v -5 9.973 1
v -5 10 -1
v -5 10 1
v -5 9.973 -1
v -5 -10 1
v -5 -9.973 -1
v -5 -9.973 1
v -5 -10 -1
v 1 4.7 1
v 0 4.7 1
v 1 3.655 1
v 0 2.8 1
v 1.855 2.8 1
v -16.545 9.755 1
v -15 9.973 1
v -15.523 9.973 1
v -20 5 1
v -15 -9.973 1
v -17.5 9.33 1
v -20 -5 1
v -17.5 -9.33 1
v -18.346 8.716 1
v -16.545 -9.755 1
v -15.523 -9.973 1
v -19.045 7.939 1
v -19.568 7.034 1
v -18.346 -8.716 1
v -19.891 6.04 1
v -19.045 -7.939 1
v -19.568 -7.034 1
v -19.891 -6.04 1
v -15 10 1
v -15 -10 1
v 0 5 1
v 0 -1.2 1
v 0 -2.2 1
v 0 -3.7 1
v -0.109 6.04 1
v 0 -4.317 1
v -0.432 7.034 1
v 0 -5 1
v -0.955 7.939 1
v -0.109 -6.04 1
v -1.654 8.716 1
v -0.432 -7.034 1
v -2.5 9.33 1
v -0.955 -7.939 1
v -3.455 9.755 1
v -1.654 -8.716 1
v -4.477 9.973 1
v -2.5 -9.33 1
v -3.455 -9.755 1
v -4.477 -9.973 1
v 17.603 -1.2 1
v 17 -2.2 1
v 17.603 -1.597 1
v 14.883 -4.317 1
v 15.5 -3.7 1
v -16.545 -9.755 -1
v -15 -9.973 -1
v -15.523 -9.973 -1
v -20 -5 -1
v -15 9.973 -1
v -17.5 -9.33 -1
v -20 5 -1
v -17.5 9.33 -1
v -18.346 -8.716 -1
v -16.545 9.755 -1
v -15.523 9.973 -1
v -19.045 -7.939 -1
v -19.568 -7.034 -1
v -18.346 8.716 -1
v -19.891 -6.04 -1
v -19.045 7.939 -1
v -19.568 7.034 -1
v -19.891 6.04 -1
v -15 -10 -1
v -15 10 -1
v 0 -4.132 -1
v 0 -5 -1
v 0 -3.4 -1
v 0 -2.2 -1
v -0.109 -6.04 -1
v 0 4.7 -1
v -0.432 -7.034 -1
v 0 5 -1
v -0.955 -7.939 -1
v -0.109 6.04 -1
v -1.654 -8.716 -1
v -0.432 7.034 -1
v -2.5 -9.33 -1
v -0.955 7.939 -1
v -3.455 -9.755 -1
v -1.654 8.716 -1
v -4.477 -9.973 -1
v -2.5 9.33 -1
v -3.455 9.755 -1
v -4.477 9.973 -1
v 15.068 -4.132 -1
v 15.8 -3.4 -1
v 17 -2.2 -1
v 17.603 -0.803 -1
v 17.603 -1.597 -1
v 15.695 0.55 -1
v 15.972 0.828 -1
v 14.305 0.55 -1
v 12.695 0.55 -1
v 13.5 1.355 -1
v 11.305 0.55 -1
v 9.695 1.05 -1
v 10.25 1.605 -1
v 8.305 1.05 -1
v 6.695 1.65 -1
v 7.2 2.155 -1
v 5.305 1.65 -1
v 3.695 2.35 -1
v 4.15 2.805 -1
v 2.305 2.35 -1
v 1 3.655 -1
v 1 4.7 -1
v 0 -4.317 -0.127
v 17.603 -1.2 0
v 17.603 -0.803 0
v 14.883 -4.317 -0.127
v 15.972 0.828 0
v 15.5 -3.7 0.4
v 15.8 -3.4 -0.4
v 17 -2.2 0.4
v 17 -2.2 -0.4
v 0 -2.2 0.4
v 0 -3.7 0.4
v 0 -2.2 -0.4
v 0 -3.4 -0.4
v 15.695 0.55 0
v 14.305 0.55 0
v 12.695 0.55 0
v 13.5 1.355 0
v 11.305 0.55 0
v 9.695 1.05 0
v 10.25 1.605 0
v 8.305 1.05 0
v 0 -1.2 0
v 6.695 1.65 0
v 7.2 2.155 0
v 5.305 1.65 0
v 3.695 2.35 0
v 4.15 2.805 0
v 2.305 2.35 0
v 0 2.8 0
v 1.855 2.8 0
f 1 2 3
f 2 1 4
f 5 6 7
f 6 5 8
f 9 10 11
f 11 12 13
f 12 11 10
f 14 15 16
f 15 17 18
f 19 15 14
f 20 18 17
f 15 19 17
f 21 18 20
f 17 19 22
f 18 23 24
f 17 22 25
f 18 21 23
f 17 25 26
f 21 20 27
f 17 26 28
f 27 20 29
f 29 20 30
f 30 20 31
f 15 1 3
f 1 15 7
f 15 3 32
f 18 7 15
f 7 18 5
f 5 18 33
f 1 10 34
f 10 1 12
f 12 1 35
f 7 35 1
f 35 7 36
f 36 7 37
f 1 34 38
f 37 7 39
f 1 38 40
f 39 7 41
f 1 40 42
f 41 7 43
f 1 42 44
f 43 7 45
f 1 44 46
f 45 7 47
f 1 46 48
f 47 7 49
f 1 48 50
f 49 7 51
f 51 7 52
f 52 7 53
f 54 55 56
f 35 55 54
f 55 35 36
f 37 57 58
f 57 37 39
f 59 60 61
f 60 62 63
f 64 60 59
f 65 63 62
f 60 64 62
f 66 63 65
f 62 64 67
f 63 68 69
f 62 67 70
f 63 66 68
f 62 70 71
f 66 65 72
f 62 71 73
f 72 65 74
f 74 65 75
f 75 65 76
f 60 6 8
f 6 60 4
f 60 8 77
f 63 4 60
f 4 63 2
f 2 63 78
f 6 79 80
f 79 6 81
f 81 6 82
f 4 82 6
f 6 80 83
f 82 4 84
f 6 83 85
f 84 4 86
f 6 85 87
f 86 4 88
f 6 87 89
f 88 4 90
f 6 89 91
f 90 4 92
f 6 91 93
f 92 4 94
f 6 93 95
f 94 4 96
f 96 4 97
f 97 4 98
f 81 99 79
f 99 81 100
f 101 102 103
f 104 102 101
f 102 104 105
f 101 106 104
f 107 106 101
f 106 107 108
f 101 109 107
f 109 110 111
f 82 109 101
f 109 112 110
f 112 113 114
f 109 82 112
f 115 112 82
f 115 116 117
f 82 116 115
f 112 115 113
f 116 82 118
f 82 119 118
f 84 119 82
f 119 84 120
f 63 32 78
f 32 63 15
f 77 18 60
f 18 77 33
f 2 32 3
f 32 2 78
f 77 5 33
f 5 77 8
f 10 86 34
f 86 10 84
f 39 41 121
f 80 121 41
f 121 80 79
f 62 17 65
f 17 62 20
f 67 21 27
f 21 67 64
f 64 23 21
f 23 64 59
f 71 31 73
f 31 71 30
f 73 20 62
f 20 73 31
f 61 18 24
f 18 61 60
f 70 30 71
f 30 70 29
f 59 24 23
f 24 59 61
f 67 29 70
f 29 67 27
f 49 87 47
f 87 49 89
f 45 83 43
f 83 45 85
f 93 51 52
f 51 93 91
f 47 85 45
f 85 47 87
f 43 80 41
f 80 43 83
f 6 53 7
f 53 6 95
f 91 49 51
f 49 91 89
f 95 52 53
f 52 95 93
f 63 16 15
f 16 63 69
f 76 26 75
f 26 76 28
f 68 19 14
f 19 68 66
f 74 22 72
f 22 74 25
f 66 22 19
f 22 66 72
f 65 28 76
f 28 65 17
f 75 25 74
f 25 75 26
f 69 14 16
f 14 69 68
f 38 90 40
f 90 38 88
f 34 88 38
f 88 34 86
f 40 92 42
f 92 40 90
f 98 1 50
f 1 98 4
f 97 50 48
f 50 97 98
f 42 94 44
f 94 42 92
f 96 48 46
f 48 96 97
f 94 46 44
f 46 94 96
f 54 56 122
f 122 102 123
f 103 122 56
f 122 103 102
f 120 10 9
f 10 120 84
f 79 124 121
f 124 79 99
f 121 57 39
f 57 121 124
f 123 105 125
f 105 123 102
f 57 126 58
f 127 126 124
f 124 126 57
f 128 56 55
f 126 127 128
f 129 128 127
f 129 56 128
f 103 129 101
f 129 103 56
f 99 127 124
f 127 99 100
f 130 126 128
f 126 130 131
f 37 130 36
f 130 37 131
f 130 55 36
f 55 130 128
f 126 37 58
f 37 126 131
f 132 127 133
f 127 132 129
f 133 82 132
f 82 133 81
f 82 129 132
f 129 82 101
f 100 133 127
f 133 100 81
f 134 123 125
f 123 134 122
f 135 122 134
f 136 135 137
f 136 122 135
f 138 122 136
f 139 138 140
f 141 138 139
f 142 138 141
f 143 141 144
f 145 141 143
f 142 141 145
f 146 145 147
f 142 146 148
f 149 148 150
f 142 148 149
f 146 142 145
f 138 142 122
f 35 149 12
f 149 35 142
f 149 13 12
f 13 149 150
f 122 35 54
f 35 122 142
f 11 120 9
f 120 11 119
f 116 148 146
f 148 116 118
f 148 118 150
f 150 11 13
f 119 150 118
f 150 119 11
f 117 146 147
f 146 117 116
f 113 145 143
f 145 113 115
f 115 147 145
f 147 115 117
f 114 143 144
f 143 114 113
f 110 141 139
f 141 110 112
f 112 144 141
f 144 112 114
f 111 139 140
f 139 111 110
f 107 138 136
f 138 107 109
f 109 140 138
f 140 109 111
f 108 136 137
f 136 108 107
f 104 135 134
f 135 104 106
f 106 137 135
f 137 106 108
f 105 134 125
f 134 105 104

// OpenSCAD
// Original Key by Nirav Patel <http://eclecti.cc>
// This work is licensed under a Creative Commons Attribution 3.0 Unported License.

//The measurements used below are from the center of the key to the cut. All measurements are in mm. 
//(this is just a reference table to help pick cuts below)
//0:0 = .335"
//1:1 = .320"
//2:2 = .305"
//3:3 = .290"
//4:4 = .275"
//5:5 = .260"
//6:6 = .245"
//7:7 = .230"
//8:8 = .215"
//9:9 = .200"

//(cut at the handle of key)
cut_1 = 0; //[0:9] Don't change cut_1, currently it fixes a shoulder issue.
cut_2 = 70; //[0:9] 6.30mm
cut_3 = 130; //[0:9] 5.70mm
cut_4 = 180; //[0:9] 5.20mm
cut_5 = 180; //[0:9] 5.20mm
//(cut at the tip of key)


function mm(i) = i*25.4;
$fn=30;

module rounded(size, r) {
  union() {
    translate([r, 0, 0]) cube([size[0]-2*r, size[1], size[2]]);
    translate([0, r, 0]) cube([size[0], size[1]-2*r, size[2]]);
    translate([r, r, 0]) cylinder(h=size[2], r=r);
    translate([size[0]-r, r, 0]) cylinder(h=size[2], r=r);
    translate([r, size[1]-r, 0]) cylinder(h=size[2], r=r);
    translate([size[0]-r, size[1]-r, 0]) cylinder(h=size[2], r=r);
  }
}

module bit() {
  w = 4;
  difference() {
    translate([-w/2, 0, 0]) cube([w, mm(1), w]);
    translate([-mm(7/256), 0, 0]) rotate([0, 0, 135]) cube([w, w, w]);
    translate([mm(7/256), 0, 0]) rotate([0, 0, -45]) cube([w, w, w]);
  }
}

module masterPadlock(bits) {
  thickness = 2;//mm
  length = 18;//mm
  width = 9.4;//mm
  
  shoulder = 3;
  pin_spacing = 3;
  depth_inc = 0.01;
  
  // Handle size
  h_l = 20;
  h_w = 20;
  h_d = 2;
  difference() {
    // blade and key handle
    union() {
      translate([-h_l, -h_w/2, -h_d/2]) rounded([h_l, h_w, thickness], 5);
      translate([0, -width/2, -thickness/2])intersection() {
        // cut a little off the tip to avoid going too long
        cube([length - mm(1/64), width, thickness]);
        translate([0, mm(1/4), thickness*3/4]) rotate([0, 90, 0]) cylinder(h=length,r=6, r=6);
      }
    }
    
    // chamfer the tip
    translate([length, -width/2 + 3.5, -thickness/2]) {
      rotate([0, 0, 45]) cube([10, 10, thickness]);
      rotate([0, 0, 225]) cube([10, 10, thickness]);
    }
 


    // cut the channels in the key.  designed more for printability than accuracy
    union() {
      translate([0, -width/2 + 1, thickness/2-0.6]) cube([length, 1.5, 0.6]);
      translate([0, -width/2 + 1.3, -thickness/2]) cube([length, 1.2, 0.6]);
      translate([0, -width/2 + 3.5, thickness/2-1]) cube([length, 4, 1]);
      translate([shoulder, -width/2 + 3.5, thickness/2-1]) cube([length, 5, 1]);
    }

    // Do the actual bitting
    for (b = [0:4]) {
      translate([shoulder + b*pin_spacing, width/4 - bits[b]*depth_inc, -thickness]) bit();
    }
    
  }
}

masterPadlock([cut_1,cut_2,cut_3,cut_4,cut_5]);
